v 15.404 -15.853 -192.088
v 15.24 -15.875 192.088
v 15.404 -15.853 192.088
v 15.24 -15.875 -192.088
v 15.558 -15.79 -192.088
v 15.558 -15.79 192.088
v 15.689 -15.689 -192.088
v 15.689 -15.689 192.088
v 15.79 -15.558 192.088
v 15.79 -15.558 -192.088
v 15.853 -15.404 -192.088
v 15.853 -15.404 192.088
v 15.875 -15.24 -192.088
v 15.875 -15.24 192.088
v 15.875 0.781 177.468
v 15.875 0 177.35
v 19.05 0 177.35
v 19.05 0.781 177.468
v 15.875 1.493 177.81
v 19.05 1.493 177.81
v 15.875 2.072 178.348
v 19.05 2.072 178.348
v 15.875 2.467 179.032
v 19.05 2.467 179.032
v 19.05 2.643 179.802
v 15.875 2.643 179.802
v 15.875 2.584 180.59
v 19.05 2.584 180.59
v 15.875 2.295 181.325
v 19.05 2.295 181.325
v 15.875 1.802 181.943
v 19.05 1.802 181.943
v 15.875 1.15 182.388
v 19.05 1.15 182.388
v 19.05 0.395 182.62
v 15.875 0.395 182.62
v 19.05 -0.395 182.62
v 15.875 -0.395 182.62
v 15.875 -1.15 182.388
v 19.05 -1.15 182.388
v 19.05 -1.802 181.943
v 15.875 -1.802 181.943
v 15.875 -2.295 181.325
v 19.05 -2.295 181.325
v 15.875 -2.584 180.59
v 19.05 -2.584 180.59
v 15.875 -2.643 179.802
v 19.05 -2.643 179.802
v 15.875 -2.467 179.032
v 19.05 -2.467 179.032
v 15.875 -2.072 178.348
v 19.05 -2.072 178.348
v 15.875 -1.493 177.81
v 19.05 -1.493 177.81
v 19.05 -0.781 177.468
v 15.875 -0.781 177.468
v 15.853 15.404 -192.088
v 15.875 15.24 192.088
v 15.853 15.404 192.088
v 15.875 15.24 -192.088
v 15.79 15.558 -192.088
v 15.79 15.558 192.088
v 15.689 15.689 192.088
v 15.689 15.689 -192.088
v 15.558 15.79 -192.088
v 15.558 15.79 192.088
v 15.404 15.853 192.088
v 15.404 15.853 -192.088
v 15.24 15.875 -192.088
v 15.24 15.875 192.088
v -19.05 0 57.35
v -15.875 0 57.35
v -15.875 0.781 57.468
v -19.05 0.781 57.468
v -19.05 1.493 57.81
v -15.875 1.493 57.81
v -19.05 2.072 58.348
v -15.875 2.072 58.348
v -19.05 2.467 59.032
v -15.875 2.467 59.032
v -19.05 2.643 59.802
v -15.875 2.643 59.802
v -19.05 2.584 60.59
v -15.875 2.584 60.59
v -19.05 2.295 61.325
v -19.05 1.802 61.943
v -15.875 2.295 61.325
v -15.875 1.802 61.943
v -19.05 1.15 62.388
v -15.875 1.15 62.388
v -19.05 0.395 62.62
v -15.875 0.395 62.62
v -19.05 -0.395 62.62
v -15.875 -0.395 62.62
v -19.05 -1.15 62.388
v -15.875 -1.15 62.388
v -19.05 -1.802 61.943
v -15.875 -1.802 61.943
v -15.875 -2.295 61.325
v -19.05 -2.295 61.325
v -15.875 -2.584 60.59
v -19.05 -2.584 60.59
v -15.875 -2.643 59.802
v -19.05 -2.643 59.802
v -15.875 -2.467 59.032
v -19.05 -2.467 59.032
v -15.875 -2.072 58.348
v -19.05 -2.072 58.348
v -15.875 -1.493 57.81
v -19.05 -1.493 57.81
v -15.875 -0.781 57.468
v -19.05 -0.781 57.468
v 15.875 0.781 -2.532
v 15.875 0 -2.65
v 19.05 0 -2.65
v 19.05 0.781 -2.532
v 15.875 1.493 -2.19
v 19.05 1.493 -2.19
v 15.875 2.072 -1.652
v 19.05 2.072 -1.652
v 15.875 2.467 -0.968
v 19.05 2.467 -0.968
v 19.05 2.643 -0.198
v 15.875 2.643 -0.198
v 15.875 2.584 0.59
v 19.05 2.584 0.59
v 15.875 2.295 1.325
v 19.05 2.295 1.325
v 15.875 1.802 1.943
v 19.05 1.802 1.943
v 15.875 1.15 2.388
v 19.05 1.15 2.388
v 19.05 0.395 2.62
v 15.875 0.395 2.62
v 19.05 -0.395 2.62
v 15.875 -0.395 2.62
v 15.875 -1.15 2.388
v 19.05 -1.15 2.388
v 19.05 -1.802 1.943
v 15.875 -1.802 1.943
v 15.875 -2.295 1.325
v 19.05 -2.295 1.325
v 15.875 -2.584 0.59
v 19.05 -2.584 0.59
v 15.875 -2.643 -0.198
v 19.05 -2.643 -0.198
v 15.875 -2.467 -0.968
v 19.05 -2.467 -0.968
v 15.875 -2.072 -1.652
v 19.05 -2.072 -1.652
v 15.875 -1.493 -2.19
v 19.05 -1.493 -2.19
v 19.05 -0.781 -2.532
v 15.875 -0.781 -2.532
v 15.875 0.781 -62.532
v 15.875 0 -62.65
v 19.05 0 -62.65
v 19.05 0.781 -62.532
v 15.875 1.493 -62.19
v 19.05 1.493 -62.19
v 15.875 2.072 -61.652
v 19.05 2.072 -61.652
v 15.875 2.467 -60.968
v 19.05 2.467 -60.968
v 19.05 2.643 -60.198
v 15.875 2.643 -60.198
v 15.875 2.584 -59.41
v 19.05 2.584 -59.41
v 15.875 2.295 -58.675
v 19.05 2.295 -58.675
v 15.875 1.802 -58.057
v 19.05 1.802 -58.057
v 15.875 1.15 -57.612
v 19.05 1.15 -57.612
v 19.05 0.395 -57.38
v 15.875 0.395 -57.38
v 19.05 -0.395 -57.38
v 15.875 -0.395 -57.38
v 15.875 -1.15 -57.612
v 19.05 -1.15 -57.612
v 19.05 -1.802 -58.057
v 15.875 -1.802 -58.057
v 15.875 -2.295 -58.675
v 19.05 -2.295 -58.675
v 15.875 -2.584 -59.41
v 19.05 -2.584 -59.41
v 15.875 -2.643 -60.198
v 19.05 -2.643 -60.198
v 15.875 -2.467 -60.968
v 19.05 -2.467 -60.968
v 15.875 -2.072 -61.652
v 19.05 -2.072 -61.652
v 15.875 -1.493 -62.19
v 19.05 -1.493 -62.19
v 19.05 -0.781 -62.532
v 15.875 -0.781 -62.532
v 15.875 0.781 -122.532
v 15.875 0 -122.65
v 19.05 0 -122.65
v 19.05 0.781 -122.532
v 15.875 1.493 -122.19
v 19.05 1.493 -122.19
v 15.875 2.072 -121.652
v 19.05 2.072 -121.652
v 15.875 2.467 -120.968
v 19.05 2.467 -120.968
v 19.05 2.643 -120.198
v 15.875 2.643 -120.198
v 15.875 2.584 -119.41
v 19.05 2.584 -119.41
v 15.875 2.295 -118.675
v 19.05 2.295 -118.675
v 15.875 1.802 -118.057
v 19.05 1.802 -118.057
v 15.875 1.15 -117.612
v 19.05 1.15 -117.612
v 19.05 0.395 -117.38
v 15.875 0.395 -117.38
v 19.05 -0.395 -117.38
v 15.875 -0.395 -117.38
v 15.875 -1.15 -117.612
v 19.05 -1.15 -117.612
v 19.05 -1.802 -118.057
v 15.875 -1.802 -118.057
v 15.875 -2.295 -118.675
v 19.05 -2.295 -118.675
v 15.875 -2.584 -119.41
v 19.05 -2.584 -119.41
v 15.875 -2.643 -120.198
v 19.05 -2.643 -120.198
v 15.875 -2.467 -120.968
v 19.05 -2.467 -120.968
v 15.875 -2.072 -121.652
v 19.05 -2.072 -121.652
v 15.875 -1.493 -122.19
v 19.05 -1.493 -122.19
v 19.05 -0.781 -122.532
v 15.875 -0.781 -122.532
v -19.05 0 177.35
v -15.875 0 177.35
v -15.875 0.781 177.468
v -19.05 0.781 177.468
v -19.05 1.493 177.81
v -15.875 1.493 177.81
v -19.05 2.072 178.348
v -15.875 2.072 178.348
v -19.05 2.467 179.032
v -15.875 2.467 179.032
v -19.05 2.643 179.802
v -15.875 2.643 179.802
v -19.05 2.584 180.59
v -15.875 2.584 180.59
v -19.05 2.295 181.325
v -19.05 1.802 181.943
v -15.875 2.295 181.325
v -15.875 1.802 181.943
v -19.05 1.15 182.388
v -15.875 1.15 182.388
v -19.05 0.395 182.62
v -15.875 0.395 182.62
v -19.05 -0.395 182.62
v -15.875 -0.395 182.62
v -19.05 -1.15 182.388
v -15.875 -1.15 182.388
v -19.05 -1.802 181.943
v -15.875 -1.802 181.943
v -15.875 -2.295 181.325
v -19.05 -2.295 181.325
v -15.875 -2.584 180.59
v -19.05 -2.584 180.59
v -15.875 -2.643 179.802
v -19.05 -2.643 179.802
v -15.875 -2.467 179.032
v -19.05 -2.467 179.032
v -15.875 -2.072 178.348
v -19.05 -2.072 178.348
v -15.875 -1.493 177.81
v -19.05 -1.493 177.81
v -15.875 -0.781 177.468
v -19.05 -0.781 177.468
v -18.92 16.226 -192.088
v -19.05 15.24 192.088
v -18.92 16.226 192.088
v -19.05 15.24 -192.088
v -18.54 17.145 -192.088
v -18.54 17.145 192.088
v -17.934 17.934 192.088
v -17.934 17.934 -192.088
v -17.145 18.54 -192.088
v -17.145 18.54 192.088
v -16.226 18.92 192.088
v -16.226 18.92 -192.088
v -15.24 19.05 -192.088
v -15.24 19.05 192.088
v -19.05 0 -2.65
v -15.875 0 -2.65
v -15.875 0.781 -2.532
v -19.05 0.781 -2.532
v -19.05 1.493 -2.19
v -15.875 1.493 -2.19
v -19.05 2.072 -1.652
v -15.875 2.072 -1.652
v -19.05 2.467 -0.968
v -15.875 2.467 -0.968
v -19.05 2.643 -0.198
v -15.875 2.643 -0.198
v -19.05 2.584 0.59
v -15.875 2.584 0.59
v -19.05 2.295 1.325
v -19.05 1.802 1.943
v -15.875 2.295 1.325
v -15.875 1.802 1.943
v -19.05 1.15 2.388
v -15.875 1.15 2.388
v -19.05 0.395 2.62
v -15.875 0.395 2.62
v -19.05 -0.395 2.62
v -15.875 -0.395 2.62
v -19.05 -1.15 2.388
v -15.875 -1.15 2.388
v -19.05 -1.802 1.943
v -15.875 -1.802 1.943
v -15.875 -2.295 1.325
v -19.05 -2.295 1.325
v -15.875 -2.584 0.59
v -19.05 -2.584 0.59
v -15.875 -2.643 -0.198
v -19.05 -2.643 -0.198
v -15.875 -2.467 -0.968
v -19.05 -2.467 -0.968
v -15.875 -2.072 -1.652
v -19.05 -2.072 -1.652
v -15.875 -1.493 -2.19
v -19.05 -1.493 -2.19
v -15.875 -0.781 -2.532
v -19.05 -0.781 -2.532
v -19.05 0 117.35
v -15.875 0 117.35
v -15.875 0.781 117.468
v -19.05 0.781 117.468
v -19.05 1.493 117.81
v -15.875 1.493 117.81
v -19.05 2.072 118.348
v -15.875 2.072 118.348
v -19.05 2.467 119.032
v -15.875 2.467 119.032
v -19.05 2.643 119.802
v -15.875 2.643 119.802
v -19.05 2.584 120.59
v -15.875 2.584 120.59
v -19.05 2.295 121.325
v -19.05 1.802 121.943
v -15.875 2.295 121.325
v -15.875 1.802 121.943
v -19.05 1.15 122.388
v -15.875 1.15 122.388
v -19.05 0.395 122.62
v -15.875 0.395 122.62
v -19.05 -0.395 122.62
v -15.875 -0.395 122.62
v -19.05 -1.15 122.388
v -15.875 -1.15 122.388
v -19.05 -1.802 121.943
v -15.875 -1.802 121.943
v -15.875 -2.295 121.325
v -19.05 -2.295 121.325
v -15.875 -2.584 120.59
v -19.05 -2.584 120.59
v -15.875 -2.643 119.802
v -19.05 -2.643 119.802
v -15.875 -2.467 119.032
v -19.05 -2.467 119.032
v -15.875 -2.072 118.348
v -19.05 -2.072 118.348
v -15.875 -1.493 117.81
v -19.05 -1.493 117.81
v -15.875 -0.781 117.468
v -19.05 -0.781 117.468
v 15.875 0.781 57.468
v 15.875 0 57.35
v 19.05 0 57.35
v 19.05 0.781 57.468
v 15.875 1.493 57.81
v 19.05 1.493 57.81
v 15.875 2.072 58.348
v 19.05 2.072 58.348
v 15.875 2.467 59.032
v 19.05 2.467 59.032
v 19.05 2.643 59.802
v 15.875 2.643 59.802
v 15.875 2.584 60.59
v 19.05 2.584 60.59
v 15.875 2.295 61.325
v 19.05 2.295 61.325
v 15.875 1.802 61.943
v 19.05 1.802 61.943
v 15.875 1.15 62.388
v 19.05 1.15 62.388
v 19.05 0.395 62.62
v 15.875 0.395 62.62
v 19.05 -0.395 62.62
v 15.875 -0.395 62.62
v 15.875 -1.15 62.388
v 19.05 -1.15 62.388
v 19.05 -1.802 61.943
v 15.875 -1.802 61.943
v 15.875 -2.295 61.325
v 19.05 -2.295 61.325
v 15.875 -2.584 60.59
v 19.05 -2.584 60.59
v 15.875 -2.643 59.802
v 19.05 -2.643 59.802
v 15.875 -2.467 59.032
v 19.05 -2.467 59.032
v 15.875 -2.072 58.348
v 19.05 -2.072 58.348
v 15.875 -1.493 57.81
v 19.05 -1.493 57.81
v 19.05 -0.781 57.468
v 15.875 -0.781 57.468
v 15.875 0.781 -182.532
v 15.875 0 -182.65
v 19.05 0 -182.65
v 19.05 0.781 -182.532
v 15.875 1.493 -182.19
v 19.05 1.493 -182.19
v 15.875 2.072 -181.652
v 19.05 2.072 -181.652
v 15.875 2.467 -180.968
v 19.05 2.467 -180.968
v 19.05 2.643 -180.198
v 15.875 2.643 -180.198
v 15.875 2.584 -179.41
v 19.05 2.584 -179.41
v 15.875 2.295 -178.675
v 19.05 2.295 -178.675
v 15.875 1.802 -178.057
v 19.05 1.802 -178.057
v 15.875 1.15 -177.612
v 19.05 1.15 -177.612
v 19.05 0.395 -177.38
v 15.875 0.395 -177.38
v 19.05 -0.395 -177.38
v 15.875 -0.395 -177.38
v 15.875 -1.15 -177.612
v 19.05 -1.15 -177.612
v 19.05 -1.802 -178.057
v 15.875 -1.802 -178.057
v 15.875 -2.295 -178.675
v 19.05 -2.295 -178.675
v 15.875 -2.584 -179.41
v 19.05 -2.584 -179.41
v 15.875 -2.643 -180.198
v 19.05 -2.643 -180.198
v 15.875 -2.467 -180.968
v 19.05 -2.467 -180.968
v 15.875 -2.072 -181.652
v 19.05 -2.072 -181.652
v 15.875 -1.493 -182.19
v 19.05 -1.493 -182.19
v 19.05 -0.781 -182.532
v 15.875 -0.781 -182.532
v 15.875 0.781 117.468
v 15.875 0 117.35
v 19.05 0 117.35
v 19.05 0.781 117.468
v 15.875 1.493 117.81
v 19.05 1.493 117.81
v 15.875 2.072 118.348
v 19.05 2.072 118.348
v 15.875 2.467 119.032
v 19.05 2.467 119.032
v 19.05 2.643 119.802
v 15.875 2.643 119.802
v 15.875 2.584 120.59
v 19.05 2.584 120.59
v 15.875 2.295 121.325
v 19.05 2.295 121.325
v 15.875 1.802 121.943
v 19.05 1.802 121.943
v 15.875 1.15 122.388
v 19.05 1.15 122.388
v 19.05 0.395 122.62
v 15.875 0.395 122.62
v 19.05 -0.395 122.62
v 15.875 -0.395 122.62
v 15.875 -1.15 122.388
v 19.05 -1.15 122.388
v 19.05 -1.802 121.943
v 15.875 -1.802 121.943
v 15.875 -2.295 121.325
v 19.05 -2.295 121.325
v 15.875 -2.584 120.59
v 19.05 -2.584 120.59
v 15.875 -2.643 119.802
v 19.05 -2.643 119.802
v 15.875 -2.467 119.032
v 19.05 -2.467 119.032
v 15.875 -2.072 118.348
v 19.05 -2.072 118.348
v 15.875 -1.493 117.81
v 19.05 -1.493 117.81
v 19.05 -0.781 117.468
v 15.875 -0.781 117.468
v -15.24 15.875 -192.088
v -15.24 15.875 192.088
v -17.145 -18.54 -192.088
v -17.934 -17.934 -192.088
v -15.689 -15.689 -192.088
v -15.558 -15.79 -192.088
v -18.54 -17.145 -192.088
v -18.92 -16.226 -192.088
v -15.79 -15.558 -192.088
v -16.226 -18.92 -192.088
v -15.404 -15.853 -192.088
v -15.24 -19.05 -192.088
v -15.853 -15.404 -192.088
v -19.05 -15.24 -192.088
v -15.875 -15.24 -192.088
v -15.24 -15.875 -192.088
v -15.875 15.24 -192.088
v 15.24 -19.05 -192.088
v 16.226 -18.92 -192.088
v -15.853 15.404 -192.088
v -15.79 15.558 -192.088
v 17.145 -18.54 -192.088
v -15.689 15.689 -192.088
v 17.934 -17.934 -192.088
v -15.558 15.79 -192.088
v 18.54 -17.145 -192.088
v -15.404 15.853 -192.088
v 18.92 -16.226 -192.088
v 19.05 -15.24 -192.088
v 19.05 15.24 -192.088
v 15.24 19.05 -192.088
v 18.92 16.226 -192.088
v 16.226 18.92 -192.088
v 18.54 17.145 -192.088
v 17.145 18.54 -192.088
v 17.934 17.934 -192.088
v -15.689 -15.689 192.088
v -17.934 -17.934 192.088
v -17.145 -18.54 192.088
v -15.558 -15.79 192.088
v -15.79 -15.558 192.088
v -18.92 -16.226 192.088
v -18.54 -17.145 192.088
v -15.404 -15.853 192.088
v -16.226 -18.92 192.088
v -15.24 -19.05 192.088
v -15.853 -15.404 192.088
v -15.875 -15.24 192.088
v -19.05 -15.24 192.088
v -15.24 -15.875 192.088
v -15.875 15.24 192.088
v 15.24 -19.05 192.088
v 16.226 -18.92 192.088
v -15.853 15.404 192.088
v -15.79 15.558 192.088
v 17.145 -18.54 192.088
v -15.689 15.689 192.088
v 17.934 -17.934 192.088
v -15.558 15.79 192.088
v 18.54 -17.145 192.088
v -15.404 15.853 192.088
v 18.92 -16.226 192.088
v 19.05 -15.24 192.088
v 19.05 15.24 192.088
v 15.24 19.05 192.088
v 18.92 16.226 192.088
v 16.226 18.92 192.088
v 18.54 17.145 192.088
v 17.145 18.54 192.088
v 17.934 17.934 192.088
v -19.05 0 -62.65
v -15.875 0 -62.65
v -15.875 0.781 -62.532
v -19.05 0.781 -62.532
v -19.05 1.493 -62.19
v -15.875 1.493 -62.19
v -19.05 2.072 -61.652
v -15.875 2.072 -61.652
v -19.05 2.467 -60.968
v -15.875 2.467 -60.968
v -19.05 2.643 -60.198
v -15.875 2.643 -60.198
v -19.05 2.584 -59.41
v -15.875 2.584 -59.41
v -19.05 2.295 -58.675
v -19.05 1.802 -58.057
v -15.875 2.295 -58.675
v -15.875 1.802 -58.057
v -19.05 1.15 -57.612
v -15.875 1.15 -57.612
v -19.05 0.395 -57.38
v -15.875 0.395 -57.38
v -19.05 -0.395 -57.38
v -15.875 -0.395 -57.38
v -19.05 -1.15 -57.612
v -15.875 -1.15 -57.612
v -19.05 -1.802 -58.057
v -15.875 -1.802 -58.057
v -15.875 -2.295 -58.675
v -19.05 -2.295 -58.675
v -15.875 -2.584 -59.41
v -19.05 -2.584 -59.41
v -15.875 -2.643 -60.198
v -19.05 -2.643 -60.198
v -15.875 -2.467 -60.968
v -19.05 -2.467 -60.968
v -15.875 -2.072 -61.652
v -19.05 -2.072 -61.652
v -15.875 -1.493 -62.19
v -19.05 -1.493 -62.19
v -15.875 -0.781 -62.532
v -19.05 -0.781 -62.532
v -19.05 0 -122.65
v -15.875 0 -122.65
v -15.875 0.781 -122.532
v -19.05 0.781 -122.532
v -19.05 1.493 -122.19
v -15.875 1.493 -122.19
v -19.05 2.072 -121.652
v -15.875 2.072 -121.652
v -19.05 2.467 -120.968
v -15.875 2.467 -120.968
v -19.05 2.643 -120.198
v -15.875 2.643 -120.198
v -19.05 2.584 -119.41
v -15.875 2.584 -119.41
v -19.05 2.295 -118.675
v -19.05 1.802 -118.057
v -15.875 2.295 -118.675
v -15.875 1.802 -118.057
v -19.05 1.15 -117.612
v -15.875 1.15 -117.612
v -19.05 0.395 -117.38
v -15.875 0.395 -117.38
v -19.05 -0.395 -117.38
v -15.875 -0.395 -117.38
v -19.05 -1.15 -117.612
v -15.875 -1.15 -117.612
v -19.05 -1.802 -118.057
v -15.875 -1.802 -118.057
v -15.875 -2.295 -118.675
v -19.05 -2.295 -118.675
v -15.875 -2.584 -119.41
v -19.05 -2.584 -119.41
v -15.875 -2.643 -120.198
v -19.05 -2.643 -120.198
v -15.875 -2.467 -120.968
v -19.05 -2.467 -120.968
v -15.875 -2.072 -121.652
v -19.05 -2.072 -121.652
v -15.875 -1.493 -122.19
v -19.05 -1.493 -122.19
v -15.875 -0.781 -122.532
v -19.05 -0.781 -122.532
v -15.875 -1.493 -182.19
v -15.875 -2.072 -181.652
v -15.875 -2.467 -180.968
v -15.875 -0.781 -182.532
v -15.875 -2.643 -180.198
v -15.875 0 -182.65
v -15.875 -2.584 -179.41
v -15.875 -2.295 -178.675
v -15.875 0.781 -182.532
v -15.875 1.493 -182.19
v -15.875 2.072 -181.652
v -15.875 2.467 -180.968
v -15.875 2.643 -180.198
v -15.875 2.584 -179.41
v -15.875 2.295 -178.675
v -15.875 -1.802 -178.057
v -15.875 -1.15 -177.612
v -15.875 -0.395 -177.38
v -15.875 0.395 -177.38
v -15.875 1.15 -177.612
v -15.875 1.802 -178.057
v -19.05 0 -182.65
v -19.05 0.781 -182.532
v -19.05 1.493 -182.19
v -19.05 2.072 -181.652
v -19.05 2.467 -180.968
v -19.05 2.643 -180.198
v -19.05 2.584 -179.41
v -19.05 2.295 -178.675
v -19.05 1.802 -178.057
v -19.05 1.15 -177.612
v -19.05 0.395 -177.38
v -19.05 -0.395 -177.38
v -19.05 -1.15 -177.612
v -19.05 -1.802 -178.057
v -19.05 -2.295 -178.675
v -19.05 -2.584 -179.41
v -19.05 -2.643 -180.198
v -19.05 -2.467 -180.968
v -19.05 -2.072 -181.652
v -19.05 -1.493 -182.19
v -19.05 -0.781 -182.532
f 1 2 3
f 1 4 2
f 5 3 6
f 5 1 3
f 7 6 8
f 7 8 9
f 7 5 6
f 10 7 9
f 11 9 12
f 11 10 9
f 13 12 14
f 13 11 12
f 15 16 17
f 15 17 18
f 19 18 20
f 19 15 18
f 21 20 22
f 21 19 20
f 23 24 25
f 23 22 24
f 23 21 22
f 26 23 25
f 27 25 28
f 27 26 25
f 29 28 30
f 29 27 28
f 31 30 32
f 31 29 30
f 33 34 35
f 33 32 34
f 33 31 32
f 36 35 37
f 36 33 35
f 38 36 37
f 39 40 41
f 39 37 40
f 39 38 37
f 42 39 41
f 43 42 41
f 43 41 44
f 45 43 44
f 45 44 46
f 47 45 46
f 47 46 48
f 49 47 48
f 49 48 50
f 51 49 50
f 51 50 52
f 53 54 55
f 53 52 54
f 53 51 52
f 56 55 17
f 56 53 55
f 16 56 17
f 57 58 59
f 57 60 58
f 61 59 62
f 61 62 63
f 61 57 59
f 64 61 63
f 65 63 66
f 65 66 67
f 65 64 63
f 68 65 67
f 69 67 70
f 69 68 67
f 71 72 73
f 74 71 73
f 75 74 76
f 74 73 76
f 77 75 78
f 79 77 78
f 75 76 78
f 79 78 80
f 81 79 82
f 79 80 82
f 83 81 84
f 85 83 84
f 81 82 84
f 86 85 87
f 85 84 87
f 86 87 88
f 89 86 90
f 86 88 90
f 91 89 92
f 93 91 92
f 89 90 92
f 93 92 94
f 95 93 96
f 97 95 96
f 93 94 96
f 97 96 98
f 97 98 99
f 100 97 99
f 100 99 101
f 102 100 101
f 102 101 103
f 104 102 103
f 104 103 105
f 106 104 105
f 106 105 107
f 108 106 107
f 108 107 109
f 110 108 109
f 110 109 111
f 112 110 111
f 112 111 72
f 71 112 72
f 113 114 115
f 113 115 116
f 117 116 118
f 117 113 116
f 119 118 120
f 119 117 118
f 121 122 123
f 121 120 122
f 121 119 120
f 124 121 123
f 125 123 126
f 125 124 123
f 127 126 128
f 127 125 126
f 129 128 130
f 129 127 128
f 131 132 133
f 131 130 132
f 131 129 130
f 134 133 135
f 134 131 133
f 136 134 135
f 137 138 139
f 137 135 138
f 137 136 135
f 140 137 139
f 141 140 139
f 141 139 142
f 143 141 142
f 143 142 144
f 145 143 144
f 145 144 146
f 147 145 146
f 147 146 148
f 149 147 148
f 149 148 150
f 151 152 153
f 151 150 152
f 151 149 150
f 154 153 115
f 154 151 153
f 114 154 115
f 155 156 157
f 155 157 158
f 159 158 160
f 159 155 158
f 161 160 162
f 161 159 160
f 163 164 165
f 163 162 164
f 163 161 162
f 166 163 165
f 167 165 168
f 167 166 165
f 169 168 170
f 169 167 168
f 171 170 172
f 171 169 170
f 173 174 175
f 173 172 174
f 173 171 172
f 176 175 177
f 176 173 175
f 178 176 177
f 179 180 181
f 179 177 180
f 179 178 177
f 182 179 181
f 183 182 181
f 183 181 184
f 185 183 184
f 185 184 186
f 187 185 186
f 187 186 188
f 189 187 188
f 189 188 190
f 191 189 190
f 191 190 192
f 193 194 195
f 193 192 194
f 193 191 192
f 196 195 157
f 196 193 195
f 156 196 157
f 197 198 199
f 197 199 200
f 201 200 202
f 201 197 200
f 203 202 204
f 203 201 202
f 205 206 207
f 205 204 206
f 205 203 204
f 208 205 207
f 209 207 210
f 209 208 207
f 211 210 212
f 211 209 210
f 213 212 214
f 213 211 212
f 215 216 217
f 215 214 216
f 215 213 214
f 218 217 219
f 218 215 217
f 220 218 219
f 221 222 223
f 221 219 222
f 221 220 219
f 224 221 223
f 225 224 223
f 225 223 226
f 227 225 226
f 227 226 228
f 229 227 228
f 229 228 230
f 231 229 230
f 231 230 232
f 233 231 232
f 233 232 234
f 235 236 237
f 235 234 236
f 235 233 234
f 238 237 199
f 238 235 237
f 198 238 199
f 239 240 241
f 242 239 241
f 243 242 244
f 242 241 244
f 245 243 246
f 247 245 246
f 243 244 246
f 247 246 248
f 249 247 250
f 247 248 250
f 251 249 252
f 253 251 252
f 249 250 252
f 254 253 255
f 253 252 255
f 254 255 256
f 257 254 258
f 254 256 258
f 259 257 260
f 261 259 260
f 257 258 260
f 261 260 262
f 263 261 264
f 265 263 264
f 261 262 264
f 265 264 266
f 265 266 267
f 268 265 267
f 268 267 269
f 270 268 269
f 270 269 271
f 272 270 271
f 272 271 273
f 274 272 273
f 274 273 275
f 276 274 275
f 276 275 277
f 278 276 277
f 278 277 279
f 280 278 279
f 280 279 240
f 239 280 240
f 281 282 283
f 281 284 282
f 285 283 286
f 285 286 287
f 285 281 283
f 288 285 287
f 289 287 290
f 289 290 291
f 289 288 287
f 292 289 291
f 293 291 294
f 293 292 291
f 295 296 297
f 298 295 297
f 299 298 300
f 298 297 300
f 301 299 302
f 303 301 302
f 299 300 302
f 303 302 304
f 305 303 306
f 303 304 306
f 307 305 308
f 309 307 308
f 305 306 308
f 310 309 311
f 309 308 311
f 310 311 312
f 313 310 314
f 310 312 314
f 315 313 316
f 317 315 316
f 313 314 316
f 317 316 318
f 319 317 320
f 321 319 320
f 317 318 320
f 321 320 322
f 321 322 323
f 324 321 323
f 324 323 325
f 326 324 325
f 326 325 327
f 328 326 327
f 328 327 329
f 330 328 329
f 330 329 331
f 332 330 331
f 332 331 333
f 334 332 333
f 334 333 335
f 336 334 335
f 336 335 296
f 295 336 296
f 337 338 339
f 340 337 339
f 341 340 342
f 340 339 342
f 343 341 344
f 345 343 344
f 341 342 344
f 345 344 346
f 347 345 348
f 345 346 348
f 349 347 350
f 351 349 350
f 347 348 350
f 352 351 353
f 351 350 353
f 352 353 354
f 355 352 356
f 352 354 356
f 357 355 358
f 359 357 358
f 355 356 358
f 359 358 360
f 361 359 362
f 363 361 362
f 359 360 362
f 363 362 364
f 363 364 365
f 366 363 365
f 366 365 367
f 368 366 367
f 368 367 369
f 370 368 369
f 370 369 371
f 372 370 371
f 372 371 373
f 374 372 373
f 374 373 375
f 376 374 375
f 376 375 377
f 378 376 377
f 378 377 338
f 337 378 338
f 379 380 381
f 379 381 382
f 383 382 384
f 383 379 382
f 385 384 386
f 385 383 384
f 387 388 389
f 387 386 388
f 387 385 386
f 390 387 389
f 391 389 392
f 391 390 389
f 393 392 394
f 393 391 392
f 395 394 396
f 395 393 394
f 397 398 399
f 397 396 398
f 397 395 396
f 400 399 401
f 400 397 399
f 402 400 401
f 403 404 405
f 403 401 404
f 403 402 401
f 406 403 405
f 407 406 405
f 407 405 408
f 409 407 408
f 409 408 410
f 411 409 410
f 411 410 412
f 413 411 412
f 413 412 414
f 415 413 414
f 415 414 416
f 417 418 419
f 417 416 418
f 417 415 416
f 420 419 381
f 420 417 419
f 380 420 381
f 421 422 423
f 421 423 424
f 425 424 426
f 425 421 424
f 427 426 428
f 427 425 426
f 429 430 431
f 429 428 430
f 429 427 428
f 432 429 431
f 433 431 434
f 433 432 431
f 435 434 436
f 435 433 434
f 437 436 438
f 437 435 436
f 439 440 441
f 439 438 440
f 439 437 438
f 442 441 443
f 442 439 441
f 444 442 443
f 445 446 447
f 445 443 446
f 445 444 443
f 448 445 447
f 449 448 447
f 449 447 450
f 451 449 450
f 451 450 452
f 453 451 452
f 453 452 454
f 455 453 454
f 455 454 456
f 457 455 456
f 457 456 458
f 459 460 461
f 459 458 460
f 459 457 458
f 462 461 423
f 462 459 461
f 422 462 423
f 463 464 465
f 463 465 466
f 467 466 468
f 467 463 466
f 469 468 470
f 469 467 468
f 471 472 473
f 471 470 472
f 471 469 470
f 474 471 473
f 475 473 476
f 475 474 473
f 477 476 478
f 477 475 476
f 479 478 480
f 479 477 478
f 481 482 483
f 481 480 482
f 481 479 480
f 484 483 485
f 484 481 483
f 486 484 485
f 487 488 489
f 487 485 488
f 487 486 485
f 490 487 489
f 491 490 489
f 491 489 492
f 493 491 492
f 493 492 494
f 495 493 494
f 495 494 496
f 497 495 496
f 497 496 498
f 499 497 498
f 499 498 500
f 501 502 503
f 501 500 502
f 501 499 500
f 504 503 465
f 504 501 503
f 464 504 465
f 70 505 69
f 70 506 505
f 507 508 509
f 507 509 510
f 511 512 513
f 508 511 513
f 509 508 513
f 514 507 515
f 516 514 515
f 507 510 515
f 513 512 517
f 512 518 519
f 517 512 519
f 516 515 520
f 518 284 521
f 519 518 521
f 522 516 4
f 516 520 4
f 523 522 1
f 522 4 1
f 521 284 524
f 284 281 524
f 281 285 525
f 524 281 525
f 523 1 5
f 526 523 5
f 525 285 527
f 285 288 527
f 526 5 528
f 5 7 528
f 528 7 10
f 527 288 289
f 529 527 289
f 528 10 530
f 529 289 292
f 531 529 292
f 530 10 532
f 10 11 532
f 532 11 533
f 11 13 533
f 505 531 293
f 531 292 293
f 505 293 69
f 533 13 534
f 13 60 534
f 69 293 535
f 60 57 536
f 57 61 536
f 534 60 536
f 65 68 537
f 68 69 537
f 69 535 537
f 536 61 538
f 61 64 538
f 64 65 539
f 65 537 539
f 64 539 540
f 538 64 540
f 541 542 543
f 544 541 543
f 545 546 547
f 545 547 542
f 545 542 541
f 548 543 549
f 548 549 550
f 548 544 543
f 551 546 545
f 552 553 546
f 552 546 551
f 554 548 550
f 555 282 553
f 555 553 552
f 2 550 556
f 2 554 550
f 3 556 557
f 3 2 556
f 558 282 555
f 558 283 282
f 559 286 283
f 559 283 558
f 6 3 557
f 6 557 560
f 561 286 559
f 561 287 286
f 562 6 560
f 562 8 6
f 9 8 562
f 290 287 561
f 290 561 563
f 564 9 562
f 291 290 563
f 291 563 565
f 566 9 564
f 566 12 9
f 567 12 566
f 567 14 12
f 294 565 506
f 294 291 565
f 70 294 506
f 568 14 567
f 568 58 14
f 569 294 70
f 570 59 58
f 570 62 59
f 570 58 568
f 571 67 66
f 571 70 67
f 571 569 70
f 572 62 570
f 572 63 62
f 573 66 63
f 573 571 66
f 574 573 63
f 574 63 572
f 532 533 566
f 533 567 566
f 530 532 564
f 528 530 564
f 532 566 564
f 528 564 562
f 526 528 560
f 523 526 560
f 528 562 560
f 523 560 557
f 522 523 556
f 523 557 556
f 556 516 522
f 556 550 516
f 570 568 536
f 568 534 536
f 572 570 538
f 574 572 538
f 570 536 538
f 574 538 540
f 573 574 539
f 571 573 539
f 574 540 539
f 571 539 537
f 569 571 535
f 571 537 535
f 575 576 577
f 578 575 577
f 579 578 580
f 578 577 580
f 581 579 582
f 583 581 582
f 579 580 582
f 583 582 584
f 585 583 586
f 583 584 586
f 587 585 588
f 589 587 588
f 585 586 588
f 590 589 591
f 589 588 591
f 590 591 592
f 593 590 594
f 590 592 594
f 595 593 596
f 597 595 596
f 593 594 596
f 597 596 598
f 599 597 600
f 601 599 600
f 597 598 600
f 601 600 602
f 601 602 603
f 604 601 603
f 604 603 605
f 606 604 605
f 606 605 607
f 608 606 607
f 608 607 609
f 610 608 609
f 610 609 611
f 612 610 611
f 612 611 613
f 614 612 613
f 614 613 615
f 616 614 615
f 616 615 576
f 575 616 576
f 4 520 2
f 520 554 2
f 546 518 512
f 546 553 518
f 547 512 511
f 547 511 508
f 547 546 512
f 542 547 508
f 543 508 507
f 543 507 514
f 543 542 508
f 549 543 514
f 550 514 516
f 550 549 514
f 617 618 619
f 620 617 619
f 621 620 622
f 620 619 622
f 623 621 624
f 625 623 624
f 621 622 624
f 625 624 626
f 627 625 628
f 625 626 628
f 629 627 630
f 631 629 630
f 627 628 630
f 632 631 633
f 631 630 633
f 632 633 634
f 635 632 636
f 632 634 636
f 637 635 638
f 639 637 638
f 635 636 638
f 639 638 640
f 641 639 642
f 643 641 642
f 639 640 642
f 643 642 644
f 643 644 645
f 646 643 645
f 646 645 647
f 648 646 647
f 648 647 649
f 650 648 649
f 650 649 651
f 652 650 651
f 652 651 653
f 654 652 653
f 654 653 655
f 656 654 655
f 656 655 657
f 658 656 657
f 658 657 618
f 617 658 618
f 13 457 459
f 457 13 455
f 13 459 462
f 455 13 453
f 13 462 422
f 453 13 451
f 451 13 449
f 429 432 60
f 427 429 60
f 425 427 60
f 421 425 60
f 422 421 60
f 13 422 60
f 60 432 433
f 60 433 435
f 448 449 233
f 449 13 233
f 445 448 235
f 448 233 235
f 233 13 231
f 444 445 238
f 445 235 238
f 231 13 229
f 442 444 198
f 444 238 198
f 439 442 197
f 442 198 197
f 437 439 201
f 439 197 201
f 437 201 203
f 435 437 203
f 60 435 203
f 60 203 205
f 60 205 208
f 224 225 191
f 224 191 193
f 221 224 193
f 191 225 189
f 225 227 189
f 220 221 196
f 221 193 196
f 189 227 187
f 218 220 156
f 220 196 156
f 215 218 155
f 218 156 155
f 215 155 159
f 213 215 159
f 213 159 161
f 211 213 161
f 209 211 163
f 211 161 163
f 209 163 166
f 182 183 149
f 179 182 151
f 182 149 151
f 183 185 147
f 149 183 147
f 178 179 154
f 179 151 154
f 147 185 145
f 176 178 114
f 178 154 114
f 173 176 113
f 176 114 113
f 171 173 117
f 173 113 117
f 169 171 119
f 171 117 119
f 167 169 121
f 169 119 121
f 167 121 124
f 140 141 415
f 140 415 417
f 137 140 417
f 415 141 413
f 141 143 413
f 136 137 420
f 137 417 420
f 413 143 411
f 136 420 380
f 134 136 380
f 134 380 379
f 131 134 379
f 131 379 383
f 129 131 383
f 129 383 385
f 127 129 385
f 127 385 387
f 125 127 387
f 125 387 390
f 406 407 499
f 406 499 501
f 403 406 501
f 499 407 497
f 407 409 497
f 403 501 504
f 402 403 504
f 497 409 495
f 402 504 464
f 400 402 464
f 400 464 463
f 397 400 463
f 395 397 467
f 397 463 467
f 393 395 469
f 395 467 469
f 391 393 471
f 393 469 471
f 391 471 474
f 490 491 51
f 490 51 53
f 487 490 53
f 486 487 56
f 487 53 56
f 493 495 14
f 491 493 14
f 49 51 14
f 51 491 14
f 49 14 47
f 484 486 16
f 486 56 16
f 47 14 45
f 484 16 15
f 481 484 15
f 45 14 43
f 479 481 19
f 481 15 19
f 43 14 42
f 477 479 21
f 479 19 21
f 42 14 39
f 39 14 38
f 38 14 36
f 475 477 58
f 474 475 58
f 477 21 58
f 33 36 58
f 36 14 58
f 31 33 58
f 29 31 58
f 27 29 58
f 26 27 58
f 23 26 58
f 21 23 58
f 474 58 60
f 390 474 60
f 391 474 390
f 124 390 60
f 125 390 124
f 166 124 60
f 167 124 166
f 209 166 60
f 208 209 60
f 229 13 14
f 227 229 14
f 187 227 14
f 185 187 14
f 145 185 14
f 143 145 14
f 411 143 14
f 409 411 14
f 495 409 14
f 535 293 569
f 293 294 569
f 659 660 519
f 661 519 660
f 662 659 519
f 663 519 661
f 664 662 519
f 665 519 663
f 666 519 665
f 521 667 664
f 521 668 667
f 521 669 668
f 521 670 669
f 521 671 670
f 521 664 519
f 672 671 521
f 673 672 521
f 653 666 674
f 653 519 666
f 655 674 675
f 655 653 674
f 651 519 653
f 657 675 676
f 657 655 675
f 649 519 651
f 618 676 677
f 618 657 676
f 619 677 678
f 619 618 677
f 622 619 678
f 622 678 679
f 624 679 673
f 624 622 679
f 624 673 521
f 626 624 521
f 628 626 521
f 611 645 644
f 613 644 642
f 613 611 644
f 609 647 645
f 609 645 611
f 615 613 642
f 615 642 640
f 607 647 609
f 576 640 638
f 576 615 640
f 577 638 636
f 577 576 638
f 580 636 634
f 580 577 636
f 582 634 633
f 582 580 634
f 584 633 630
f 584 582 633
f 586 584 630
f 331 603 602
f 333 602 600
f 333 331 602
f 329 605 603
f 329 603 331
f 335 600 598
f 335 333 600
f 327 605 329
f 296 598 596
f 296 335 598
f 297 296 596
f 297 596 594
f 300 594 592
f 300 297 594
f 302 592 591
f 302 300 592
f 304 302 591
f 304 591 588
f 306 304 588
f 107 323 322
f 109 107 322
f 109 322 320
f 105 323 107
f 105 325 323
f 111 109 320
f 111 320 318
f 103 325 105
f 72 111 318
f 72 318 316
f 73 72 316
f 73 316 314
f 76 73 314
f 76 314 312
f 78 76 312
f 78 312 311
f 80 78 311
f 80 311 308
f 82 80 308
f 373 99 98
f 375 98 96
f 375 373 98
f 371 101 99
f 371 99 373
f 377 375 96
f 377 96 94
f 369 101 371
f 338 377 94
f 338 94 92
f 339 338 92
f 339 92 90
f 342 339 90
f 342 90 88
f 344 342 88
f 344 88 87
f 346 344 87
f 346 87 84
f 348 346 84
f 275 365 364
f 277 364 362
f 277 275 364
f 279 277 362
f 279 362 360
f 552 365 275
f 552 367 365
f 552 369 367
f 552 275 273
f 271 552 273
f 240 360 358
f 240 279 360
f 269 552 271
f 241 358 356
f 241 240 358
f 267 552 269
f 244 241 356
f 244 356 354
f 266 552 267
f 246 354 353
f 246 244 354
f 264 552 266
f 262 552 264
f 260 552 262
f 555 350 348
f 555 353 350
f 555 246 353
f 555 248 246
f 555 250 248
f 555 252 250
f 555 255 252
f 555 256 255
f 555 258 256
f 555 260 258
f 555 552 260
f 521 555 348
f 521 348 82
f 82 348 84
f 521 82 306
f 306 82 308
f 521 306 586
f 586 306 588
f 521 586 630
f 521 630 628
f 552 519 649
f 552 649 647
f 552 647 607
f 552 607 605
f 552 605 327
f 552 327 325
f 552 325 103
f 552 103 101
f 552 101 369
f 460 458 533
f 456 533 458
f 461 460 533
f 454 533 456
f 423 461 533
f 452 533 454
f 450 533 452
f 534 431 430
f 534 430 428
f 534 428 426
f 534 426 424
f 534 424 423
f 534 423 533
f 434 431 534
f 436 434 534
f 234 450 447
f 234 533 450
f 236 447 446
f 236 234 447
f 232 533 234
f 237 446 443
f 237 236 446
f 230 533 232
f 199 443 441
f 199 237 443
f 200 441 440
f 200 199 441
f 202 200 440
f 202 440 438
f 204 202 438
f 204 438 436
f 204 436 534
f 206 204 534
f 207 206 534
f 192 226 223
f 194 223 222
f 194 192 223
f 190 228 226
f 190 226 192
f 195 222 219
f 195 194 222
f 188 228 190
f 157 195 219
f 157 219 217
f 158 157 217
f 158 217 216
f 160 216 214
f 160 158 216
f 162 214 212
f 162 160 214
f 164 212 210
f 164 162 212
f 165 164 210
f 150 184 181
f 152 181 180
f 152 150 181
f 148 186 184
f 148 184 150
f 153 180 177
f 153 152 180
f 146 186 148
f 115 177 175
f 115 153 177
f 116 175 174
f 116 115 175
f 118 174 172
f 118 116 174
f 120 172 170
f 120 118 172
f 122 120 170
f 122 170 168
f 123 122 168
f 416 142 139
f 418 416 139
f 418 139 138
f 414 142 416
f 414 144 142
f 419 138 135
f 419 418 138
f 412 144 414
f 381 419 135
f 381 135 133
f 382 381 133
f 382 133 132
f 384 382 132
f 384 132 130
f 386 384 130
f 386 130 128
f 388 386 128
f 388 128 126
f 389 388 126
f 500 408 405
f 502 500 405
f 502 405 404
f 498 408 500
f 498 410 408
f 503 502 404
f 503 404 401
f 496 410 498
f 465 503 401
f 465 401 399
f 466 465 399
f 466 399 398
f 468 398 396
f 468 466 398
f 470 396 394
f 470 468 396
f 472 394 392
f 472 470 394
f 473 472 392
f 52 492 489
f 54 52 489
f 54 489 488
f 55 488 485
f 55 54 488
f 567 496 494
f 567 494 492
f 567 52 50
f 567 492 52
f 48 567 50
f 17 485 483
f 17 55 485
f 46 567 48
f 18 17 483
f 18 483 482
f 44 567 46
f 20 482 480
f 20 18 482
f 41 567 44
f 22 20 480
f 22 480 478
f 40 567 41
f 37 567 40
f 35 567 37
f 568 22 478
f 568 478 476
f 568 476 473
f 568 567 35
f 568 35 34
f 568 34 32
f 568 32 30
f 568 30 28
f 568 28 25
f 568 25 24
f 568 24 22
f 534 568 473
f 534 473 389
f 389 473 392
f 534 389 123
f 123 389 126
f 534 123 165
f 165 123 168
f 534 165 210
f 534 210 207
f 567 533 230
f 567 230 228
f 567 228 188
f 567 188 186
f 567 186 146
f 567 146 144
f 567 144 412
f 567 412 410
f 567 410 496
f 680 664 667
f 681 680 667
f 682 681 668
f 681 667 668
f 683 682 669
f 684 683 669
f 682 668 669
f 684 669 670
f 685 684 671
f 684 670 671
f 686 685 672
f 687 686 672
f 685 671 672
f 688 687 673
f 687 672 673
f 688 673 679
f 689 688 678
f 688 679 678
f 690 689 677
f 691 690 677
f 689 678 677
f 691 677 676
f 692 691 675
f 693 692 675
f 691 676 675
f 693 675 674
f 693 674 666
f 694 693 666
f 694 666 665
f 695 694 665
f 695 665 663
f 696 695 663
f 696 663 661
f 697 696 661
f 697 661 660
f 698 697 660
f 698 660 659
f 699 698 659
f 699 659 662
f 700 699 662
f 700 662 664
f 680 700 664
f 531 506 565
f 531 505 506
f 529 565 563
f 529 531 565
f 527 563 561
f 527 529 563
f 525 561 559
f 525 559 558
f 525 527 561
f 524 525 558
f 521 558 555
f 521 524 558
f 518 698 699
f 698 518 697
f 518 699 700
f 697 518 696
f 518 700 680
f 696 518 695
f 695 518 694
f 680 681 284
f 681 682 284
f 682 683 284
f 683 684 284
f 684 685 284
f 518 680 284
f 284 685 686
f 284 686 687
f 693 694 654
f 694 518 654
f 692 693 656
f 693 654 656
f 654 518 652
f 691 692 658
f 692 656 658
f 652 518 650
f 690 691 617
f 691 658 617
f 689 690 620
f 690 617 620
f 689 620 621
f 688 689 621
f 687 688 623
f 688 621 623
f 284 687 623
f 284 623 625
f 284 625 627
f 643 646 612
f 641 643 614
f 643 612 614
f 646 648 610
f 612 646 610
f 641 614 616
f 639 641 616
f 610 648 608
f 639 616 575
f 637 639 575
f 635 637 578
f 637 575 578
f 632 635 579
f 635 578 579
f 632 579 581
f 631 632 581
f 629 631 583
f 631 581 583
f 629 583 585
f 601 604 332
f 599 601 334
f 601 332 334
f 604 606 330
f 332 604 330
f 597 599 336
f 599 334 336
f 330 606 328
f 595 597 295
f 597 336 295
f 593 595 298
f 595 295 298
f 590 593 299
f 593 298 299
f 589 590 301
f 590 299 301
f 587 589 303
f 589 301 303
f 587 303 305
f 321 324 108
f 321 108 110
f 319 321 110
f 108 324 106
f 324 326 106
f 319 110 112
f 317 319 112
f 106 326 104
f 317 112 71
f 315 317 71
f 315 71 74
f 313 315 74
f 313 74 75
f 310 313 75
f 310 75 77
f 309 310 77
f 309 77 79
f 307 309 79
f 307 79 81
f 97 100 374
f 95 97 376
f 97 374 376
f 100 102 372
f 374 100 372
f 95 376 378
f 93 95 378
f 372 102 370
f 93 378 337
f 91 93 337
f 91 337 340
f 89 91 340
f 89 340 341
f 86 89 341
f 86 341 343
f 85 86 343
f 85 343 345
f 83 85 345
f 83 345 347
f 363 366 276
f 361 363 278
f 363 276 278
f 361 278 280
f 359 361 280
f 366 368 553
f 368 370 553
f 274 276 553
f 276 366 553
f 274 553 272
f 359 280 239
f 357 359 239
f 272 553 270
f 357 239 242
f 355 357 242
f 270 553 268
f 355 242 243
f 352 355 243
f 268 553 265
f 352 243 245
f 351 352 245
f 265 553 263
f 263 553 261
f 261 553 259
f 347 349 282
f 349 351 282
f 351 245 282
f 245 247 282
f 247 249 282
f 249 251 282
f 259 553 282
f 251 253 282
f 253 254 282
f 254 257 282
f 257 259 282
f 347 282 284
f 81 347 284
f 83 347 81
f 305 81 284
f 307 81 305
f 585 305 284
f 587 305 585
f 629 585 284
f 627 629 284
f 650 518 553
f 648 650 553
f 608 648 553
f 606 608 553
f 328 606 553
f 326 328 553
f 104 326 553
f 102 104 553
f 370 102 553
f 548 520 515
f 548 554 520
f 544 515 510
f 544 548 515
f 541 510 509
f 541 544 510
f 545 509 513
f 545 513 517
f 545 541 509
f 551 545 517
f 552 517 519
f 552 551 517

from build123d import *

# Parameters (mm, degrees)
SKETCH1_W               = 38.1
SKETCH1_H               = 38.1
SKETCH1_W_2             = 31.75
SKETCH1_H_2             = 31.75
BOSS_EXTRUDE1_DEPTH     = 192.0875
FILLET1_R               = 3.81
FILLET2_R               = 0.635
SKETCH2_R               = 2.65
CUT_EXTRUDE1_DEPTH      = 20.05
CUT_EXTRUDE1_DEPTH_BACK = 20.05


with BuildPart() as part:
    # Sketch1 → Boss-Extrude1 (new body, symmetric)
    with BuildSketch(Plane.XY):
        Rectangle(SKETCH1_W, SKETCH1_H)
        Rectangle(SKETCH1_W_2, SKETCH1_H_2, mode=Mode.SUBTRACT)
    extrude(amount=BOSS_EXTRUDE1_DEPTH, both=True)

    # Fillet1
    fillet1_edges = [part.edges().sort_by_distance(p)[0] for p in [
        (19.05, -19.05, 0),
        (-19.05, -19.05, 0),
        (-19.05, 19.05, 0),
        (19.05, 19.05, 0),
    ]]
    fillet(fillet1_edges, radius=FILLET1_R)

    # Fillet2
    fillet2_edges = [part.edges().sort_by_distance(p)[0] for p in [
        (15.875, -15.875, 0),
        (15.875, 15.875, 0),
        (-15.875, 15.875, 0),
        (-15.875, -15.875, 0),
    ]]
    fillet(fillet2_edges, radius=FILLET2_R)

    # Sketch2 → Cut-Extrude1 (cut, two sides)
    with BuildSketch(Plane(origin=(0, 0, 0), x_dir=(0, 0, -1), z_dir=(1, 0, 0))) as cut_extrude1_sk:
        with Locations((-180, 0)):
            Circle(SKETCH2_R)
        with Locations((-120, 0)):
            Circle(SKETCH2_R)
        with Locations((-60, 0)):
            Circle(SKETCH2_R)
        Circle(SKETCH2_R)
        with Locations((60, 0)):
            Circle(SKETCH2_R)
        with Locations((120, 0)):
            Circle(SKETCH2_R)
        with Locations((180, 0)):
            Circle(SKETCH2_R)
    extrude(amount=CUT_EXTRUDE1_DEPTH, mode=Mode.SUBTRACT)
    extrude(cut_extrude1_sk.sketch, amount=-CUT_EXTRUDE1_DEPTH_BACK, mode=Mode.SUBTRACT)


solid = part.part
